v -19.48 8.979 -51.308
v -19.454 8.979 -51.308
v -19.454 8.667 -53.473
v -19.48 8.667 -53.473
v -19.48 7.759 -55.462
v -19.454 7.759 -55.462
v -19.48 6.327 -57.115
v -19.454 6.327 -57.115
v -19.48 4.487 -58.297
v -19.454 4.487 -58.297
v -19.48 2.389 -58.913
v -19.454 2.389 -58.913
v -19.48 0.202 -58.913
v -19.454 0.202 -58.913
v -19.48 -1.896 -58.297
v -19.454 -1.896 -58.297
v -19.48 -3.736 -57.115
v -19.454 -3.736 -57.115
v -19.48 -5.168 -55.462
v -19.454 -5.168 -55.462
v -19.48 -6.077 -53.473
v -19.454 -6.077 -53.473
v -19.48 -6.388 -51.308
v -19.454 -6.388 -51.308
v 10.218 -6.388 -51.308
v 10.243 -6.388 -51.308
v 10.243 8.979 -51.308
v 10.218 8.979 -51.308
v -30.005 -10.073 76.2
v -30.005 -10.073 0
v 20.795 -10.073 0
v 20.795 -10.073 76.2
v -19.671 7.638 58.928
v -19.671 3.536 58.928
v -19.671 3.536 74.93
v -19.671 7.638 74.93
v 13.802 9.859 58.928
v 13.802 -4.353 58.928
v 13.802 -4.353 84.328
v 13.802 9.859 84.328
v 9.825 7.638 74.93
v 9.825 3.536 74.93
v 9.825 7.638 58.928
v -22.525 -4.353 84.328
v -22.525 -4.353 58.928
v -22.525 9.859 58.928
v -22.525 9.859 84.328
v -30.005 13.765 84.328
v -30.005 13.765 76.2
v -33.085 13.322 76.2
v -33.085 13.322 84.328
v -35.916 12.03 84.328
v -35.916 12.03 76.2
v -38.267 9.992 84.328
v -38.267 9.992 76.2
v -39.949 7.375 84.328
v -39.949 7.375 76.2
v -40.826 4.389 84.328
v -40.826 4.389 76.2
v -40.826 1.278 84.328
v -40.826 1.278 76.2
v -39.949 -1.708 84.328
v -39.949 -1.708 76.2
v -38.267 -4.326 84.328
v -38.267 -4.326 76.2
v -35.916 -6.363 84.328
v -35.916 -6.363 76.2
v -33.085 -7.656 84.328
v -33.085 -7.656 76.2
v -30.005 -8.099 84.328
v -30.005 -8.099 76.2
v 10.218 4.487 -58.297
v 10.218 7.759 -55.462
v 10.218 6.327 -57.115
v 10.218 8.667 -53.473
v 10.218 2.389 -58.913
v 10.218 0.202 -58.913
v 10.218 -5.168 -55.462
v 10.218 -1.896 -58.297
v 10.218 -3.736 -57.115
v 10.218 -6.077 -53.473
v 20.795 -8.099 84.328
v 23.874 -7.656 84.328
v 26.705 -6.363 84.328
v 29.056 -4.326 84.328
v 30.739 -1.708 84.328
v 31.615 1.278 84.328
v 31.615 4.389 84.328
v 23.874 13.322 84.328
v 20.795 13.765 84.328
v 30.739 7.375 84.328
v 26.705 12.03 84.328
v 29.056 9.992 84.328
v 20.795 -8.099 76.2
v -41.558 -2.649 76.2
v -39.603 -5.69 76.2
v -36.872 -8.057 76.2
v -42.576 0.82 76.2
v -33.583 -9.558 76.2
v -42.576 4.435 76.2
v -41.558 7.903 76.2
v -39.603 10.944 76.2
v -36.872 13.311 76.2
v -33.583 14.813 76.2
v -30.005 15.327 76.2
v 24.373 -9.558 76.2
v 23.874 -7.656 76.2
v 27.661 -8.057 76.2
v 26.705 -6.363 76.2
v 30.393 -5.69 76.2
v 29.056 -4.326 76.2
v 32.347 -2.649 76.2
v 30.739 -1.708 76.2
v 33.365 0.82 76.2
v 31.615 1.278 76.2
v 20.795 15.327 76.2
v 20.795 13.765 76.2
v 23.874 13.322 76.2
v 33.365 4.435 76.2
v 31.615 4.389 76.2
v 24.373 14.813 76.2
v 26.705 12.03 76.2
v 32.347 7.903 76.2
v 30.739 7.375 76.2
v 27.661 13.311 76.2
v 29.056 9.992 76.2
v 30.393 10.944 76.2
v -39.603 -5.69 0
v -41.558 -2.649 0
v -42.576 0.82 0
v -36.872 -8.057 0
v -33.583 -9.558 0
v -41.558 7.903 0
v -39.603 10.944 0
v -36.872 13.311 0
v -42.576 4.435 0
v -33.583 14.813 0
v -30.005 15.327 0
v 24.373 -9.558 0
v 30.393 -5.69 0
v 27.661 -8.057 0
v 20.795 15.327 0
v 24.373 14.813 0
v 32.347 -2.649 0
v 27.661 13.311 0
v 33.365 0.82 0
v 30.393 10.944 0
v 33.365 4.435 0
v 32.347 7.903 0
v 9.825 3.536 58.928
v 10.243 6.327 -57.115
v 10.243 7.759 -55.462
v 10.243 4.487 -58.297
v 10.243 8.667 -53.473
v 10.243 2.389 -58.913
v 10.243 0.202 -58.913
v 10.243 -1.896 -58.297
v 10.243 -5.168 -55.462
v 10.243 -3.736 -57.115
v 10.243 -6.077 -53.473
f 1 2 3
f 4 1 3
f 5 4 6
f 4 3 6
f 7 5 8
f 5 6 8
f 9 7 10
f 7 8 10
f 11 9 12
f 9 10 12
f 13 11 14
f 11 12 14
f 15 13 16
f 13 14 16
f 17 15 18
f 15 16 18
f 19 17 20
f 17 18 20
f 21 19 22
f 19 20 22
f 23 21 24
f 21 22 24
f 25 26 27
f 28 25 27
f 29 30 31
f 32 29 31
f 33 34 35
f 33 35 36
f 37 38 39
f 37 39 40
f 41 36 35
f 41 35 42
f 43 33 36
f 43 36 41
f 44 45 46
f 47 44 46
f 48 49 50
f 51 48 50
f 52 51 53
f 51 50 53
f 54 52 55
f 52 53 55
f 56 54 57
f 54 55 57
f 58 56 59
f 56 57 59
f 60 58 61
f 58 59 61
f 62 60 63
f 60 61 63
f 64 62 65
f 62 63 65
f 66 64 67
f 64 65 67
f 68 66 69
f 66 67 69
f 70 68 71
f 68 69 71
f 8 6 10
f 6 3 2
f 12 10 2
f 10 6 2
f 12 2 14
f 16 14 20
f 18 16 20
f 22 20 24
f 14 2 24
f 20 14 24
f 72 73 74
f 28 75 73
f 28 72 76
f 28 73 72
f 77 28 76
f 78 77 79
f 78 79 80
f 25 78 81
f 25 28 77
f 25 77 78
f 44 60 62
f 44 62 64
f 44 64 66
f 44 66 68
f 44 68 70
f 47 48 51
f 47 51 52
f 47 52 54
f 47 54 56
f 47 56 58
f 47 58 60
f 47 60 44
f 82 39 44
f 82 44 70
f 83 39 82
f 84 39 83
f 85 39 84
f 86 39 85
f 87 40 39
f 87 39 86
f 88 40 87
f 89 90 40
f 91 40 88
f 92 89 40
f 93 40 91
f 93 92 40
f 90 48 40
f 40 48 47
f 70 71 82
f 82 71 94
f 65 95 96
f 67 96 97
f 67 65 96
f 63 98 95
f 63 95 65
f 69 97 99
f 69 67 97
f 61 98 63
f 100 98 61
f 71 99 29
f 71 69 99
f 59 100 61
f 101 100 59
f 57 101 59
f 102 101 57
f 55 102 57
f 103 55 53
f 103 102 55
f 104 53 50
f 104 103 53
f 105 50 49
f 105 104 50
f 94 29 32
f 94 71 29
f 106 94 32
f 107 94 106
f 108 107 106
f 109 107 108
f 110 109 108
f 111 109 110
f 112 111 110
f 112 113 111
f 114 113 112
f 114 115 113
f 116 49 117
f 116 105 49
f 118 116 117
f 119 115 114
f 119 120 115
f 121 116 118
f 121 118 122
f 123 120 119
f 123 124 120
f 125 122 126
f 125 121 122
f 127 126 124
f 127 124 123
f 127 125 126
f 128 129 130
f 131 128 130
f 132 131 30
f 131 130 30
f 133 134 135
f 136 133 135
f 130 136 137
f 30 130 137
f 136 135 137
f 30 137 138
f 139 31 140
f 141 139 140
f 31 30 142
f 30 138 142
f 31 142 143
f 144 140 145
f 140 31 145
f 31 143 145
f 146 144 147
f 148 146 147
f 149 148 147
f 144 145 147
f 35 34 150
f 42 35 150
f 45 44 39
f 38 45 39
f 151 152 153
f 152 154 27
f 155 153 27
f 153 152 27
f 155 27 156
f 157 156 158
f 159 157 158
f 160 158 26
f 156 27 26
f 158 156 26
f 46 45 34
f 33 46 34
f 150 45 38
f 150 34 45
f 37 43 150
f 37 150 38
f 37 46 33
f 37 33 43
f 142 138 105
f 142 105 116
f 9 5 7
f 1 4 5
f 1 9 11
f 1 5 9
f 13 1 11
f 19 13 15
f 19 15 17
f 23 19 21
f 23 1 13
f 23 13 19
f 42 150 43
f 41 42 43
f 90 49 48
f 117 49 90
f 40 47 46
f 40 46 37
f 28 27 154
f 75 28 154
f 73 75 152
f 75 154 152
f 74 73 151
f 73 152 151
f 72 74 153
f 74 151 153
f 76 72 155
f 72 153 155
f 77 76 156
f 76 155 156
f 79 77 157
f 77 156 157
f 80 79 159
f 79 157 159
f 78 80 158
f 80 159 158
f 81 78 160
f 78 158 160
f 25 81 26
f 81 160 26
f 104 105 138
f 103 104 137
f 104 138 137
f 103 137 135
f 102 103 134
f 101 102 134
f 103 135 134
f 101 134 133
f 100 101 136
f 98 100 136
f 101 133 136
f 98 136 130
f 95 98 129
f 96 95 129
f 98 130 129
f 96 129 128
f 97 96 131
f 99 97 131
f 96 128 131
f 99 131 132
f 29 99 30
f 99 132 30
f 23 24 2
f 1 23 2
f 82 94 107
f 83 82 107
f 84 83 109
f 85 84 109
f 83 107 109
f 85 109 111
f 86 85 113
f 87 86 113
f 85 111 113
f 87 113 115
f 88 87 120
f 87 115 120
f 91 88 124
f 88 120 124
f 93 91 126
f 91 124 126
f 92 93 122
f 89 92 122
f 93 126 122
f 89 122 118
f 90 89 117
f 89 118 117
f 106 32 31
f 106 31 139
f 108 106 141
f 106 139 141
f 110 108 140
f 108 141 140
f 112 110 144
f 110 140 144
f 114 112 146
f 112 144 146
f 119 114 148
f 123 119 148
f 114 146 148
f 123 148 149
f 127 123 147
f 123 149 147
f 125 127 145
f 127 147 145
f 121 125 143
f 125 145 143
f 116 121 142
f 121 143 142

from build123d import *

# Parameters (mm, degrees)
F0_W      = 50.8
F0_H      = 25.4
F1_DEPTH  = 76.2
F2_W      = 50.8
F2_H      = 21.8636197969
F3_DEPTH  = 8.128
F4_W      = 36.3274179399
F4_H      = 14.2120234668
F5_DEPTH  = 25.4
F6_W      = 29.4962525368
F6_H      = 4.1017830372
F7_DEPTH  = 16.002
F11_DEPTH = 0.0254
F13_DEPTH = 0.0254


with BuildPart() as f1:
    # F0 (on Top) → F1 (new body)
    with BuildSketch(Plane.XY):
        with Locations((-4.6053994447, 2.627191287)):
            Rectangle(F0_W, F0_H)
        with BuildLine():
            Line((-30.0053994447, -10.072808713), (-30.0053994447, 15.327191287))
            ThreePointArc((-30.0053994447, 15.327191287), (-42.7053994447, 2.627191287), (-30.0053994447, -10.072808713))
        make_face()
        with BuildLine():
            ThreePointArc((20.7946005553, -10.072808713), (33.4946005553, 2.627191287), (20.7946005553, 15.327191287))
            Line((20.7946005553, 15.327191287), (20.7946005553, -10.072808713))
        make_face()
    extrude(amount=F1_DEPTH)

    # F2 (on face) → F3 (join)
    with BuildSketch(Plane.XY.offset(76.2)):
        with BuildLine():
            ThreePointArc((20.7946005553, -8.0985203385), (31.7264104538, 2.8332895599), (20.7946005553, 13.7650994584))
            Line((20.7946005553, 13.7650994584), (20.7946005553, -8.0985203385))
        make_face()
        with Locations((-4.6053994447, 2.8332895599)):
            Rectangle(F2_W, F2_H)
        with BuildLine():
            Line((-30.0053994447, -8.0985203385), (-30.0053994447, 13.7650994584))
            ThreePointArc((-30.0053994447, 13.7650994584), (-40.9372093432, 2.8332895599), (-30.0053994447, -8.0985203385))
        make_face()
    extrude(amount=F3_DEPTH)

    # F4 (on face) → F5 (cut)
    with BuildSketch(Plane.XY.offset(84.328)):
        with Locations((-4.3616183102, 2.7527492493)):
            Rectangle(F4_W, F4_H)
    extrude(amount=-F5_DEPTH, mode=Mode.SUBTRACT)

    # F6 (on face) → F7 (join)
    with BuildSketch(Plane.XY.offset(58.928)):
        with Locations((-4.9228500575, 5.587247666)):
            Rectangle(F6_W, F6_H)
    extrude(amount=F7_DEPTH)


with BuildPart() as f11:
    # F10 (on face) → F11 (new body)
    with BuildSketch(Plane(origin=(-19.4541122764, 0, 0), x_dir=(0, -1, 0), z_dir=(-1, 0, 0))):
        with BuildLine():
            Line((6.3879964873, -51.308), (-8.9785149321, -51.308))
            ThreePointArc((-8.9785149321, -51.308), (-1.2952592224, -58.9912557097), (6.3879964873, -51.308))
        make_face()
    extrude(amount=F11_DEPTH)


with BuildPart() as f13:
    # F12 (on face) → F13 (new body)
    with BuildSketch(Plane(origin=(10.243313387, 0, 0), x_dir=(0, -1, 0), z_dir=(-1, 0, 0))):
        with BuildLine():
            Line((6.3879964873, -51.308), (-8.9785149321, -51.308))
            ThreePointArc((-8.9785149321, -51.308), (-1.2952592224, -58.9912557097), (6.3879964873, -51.308))
        make_face()
    extrude(amount=F13_DEPTH)


solid = Compound([f1.part, f11.part, f13.part])
